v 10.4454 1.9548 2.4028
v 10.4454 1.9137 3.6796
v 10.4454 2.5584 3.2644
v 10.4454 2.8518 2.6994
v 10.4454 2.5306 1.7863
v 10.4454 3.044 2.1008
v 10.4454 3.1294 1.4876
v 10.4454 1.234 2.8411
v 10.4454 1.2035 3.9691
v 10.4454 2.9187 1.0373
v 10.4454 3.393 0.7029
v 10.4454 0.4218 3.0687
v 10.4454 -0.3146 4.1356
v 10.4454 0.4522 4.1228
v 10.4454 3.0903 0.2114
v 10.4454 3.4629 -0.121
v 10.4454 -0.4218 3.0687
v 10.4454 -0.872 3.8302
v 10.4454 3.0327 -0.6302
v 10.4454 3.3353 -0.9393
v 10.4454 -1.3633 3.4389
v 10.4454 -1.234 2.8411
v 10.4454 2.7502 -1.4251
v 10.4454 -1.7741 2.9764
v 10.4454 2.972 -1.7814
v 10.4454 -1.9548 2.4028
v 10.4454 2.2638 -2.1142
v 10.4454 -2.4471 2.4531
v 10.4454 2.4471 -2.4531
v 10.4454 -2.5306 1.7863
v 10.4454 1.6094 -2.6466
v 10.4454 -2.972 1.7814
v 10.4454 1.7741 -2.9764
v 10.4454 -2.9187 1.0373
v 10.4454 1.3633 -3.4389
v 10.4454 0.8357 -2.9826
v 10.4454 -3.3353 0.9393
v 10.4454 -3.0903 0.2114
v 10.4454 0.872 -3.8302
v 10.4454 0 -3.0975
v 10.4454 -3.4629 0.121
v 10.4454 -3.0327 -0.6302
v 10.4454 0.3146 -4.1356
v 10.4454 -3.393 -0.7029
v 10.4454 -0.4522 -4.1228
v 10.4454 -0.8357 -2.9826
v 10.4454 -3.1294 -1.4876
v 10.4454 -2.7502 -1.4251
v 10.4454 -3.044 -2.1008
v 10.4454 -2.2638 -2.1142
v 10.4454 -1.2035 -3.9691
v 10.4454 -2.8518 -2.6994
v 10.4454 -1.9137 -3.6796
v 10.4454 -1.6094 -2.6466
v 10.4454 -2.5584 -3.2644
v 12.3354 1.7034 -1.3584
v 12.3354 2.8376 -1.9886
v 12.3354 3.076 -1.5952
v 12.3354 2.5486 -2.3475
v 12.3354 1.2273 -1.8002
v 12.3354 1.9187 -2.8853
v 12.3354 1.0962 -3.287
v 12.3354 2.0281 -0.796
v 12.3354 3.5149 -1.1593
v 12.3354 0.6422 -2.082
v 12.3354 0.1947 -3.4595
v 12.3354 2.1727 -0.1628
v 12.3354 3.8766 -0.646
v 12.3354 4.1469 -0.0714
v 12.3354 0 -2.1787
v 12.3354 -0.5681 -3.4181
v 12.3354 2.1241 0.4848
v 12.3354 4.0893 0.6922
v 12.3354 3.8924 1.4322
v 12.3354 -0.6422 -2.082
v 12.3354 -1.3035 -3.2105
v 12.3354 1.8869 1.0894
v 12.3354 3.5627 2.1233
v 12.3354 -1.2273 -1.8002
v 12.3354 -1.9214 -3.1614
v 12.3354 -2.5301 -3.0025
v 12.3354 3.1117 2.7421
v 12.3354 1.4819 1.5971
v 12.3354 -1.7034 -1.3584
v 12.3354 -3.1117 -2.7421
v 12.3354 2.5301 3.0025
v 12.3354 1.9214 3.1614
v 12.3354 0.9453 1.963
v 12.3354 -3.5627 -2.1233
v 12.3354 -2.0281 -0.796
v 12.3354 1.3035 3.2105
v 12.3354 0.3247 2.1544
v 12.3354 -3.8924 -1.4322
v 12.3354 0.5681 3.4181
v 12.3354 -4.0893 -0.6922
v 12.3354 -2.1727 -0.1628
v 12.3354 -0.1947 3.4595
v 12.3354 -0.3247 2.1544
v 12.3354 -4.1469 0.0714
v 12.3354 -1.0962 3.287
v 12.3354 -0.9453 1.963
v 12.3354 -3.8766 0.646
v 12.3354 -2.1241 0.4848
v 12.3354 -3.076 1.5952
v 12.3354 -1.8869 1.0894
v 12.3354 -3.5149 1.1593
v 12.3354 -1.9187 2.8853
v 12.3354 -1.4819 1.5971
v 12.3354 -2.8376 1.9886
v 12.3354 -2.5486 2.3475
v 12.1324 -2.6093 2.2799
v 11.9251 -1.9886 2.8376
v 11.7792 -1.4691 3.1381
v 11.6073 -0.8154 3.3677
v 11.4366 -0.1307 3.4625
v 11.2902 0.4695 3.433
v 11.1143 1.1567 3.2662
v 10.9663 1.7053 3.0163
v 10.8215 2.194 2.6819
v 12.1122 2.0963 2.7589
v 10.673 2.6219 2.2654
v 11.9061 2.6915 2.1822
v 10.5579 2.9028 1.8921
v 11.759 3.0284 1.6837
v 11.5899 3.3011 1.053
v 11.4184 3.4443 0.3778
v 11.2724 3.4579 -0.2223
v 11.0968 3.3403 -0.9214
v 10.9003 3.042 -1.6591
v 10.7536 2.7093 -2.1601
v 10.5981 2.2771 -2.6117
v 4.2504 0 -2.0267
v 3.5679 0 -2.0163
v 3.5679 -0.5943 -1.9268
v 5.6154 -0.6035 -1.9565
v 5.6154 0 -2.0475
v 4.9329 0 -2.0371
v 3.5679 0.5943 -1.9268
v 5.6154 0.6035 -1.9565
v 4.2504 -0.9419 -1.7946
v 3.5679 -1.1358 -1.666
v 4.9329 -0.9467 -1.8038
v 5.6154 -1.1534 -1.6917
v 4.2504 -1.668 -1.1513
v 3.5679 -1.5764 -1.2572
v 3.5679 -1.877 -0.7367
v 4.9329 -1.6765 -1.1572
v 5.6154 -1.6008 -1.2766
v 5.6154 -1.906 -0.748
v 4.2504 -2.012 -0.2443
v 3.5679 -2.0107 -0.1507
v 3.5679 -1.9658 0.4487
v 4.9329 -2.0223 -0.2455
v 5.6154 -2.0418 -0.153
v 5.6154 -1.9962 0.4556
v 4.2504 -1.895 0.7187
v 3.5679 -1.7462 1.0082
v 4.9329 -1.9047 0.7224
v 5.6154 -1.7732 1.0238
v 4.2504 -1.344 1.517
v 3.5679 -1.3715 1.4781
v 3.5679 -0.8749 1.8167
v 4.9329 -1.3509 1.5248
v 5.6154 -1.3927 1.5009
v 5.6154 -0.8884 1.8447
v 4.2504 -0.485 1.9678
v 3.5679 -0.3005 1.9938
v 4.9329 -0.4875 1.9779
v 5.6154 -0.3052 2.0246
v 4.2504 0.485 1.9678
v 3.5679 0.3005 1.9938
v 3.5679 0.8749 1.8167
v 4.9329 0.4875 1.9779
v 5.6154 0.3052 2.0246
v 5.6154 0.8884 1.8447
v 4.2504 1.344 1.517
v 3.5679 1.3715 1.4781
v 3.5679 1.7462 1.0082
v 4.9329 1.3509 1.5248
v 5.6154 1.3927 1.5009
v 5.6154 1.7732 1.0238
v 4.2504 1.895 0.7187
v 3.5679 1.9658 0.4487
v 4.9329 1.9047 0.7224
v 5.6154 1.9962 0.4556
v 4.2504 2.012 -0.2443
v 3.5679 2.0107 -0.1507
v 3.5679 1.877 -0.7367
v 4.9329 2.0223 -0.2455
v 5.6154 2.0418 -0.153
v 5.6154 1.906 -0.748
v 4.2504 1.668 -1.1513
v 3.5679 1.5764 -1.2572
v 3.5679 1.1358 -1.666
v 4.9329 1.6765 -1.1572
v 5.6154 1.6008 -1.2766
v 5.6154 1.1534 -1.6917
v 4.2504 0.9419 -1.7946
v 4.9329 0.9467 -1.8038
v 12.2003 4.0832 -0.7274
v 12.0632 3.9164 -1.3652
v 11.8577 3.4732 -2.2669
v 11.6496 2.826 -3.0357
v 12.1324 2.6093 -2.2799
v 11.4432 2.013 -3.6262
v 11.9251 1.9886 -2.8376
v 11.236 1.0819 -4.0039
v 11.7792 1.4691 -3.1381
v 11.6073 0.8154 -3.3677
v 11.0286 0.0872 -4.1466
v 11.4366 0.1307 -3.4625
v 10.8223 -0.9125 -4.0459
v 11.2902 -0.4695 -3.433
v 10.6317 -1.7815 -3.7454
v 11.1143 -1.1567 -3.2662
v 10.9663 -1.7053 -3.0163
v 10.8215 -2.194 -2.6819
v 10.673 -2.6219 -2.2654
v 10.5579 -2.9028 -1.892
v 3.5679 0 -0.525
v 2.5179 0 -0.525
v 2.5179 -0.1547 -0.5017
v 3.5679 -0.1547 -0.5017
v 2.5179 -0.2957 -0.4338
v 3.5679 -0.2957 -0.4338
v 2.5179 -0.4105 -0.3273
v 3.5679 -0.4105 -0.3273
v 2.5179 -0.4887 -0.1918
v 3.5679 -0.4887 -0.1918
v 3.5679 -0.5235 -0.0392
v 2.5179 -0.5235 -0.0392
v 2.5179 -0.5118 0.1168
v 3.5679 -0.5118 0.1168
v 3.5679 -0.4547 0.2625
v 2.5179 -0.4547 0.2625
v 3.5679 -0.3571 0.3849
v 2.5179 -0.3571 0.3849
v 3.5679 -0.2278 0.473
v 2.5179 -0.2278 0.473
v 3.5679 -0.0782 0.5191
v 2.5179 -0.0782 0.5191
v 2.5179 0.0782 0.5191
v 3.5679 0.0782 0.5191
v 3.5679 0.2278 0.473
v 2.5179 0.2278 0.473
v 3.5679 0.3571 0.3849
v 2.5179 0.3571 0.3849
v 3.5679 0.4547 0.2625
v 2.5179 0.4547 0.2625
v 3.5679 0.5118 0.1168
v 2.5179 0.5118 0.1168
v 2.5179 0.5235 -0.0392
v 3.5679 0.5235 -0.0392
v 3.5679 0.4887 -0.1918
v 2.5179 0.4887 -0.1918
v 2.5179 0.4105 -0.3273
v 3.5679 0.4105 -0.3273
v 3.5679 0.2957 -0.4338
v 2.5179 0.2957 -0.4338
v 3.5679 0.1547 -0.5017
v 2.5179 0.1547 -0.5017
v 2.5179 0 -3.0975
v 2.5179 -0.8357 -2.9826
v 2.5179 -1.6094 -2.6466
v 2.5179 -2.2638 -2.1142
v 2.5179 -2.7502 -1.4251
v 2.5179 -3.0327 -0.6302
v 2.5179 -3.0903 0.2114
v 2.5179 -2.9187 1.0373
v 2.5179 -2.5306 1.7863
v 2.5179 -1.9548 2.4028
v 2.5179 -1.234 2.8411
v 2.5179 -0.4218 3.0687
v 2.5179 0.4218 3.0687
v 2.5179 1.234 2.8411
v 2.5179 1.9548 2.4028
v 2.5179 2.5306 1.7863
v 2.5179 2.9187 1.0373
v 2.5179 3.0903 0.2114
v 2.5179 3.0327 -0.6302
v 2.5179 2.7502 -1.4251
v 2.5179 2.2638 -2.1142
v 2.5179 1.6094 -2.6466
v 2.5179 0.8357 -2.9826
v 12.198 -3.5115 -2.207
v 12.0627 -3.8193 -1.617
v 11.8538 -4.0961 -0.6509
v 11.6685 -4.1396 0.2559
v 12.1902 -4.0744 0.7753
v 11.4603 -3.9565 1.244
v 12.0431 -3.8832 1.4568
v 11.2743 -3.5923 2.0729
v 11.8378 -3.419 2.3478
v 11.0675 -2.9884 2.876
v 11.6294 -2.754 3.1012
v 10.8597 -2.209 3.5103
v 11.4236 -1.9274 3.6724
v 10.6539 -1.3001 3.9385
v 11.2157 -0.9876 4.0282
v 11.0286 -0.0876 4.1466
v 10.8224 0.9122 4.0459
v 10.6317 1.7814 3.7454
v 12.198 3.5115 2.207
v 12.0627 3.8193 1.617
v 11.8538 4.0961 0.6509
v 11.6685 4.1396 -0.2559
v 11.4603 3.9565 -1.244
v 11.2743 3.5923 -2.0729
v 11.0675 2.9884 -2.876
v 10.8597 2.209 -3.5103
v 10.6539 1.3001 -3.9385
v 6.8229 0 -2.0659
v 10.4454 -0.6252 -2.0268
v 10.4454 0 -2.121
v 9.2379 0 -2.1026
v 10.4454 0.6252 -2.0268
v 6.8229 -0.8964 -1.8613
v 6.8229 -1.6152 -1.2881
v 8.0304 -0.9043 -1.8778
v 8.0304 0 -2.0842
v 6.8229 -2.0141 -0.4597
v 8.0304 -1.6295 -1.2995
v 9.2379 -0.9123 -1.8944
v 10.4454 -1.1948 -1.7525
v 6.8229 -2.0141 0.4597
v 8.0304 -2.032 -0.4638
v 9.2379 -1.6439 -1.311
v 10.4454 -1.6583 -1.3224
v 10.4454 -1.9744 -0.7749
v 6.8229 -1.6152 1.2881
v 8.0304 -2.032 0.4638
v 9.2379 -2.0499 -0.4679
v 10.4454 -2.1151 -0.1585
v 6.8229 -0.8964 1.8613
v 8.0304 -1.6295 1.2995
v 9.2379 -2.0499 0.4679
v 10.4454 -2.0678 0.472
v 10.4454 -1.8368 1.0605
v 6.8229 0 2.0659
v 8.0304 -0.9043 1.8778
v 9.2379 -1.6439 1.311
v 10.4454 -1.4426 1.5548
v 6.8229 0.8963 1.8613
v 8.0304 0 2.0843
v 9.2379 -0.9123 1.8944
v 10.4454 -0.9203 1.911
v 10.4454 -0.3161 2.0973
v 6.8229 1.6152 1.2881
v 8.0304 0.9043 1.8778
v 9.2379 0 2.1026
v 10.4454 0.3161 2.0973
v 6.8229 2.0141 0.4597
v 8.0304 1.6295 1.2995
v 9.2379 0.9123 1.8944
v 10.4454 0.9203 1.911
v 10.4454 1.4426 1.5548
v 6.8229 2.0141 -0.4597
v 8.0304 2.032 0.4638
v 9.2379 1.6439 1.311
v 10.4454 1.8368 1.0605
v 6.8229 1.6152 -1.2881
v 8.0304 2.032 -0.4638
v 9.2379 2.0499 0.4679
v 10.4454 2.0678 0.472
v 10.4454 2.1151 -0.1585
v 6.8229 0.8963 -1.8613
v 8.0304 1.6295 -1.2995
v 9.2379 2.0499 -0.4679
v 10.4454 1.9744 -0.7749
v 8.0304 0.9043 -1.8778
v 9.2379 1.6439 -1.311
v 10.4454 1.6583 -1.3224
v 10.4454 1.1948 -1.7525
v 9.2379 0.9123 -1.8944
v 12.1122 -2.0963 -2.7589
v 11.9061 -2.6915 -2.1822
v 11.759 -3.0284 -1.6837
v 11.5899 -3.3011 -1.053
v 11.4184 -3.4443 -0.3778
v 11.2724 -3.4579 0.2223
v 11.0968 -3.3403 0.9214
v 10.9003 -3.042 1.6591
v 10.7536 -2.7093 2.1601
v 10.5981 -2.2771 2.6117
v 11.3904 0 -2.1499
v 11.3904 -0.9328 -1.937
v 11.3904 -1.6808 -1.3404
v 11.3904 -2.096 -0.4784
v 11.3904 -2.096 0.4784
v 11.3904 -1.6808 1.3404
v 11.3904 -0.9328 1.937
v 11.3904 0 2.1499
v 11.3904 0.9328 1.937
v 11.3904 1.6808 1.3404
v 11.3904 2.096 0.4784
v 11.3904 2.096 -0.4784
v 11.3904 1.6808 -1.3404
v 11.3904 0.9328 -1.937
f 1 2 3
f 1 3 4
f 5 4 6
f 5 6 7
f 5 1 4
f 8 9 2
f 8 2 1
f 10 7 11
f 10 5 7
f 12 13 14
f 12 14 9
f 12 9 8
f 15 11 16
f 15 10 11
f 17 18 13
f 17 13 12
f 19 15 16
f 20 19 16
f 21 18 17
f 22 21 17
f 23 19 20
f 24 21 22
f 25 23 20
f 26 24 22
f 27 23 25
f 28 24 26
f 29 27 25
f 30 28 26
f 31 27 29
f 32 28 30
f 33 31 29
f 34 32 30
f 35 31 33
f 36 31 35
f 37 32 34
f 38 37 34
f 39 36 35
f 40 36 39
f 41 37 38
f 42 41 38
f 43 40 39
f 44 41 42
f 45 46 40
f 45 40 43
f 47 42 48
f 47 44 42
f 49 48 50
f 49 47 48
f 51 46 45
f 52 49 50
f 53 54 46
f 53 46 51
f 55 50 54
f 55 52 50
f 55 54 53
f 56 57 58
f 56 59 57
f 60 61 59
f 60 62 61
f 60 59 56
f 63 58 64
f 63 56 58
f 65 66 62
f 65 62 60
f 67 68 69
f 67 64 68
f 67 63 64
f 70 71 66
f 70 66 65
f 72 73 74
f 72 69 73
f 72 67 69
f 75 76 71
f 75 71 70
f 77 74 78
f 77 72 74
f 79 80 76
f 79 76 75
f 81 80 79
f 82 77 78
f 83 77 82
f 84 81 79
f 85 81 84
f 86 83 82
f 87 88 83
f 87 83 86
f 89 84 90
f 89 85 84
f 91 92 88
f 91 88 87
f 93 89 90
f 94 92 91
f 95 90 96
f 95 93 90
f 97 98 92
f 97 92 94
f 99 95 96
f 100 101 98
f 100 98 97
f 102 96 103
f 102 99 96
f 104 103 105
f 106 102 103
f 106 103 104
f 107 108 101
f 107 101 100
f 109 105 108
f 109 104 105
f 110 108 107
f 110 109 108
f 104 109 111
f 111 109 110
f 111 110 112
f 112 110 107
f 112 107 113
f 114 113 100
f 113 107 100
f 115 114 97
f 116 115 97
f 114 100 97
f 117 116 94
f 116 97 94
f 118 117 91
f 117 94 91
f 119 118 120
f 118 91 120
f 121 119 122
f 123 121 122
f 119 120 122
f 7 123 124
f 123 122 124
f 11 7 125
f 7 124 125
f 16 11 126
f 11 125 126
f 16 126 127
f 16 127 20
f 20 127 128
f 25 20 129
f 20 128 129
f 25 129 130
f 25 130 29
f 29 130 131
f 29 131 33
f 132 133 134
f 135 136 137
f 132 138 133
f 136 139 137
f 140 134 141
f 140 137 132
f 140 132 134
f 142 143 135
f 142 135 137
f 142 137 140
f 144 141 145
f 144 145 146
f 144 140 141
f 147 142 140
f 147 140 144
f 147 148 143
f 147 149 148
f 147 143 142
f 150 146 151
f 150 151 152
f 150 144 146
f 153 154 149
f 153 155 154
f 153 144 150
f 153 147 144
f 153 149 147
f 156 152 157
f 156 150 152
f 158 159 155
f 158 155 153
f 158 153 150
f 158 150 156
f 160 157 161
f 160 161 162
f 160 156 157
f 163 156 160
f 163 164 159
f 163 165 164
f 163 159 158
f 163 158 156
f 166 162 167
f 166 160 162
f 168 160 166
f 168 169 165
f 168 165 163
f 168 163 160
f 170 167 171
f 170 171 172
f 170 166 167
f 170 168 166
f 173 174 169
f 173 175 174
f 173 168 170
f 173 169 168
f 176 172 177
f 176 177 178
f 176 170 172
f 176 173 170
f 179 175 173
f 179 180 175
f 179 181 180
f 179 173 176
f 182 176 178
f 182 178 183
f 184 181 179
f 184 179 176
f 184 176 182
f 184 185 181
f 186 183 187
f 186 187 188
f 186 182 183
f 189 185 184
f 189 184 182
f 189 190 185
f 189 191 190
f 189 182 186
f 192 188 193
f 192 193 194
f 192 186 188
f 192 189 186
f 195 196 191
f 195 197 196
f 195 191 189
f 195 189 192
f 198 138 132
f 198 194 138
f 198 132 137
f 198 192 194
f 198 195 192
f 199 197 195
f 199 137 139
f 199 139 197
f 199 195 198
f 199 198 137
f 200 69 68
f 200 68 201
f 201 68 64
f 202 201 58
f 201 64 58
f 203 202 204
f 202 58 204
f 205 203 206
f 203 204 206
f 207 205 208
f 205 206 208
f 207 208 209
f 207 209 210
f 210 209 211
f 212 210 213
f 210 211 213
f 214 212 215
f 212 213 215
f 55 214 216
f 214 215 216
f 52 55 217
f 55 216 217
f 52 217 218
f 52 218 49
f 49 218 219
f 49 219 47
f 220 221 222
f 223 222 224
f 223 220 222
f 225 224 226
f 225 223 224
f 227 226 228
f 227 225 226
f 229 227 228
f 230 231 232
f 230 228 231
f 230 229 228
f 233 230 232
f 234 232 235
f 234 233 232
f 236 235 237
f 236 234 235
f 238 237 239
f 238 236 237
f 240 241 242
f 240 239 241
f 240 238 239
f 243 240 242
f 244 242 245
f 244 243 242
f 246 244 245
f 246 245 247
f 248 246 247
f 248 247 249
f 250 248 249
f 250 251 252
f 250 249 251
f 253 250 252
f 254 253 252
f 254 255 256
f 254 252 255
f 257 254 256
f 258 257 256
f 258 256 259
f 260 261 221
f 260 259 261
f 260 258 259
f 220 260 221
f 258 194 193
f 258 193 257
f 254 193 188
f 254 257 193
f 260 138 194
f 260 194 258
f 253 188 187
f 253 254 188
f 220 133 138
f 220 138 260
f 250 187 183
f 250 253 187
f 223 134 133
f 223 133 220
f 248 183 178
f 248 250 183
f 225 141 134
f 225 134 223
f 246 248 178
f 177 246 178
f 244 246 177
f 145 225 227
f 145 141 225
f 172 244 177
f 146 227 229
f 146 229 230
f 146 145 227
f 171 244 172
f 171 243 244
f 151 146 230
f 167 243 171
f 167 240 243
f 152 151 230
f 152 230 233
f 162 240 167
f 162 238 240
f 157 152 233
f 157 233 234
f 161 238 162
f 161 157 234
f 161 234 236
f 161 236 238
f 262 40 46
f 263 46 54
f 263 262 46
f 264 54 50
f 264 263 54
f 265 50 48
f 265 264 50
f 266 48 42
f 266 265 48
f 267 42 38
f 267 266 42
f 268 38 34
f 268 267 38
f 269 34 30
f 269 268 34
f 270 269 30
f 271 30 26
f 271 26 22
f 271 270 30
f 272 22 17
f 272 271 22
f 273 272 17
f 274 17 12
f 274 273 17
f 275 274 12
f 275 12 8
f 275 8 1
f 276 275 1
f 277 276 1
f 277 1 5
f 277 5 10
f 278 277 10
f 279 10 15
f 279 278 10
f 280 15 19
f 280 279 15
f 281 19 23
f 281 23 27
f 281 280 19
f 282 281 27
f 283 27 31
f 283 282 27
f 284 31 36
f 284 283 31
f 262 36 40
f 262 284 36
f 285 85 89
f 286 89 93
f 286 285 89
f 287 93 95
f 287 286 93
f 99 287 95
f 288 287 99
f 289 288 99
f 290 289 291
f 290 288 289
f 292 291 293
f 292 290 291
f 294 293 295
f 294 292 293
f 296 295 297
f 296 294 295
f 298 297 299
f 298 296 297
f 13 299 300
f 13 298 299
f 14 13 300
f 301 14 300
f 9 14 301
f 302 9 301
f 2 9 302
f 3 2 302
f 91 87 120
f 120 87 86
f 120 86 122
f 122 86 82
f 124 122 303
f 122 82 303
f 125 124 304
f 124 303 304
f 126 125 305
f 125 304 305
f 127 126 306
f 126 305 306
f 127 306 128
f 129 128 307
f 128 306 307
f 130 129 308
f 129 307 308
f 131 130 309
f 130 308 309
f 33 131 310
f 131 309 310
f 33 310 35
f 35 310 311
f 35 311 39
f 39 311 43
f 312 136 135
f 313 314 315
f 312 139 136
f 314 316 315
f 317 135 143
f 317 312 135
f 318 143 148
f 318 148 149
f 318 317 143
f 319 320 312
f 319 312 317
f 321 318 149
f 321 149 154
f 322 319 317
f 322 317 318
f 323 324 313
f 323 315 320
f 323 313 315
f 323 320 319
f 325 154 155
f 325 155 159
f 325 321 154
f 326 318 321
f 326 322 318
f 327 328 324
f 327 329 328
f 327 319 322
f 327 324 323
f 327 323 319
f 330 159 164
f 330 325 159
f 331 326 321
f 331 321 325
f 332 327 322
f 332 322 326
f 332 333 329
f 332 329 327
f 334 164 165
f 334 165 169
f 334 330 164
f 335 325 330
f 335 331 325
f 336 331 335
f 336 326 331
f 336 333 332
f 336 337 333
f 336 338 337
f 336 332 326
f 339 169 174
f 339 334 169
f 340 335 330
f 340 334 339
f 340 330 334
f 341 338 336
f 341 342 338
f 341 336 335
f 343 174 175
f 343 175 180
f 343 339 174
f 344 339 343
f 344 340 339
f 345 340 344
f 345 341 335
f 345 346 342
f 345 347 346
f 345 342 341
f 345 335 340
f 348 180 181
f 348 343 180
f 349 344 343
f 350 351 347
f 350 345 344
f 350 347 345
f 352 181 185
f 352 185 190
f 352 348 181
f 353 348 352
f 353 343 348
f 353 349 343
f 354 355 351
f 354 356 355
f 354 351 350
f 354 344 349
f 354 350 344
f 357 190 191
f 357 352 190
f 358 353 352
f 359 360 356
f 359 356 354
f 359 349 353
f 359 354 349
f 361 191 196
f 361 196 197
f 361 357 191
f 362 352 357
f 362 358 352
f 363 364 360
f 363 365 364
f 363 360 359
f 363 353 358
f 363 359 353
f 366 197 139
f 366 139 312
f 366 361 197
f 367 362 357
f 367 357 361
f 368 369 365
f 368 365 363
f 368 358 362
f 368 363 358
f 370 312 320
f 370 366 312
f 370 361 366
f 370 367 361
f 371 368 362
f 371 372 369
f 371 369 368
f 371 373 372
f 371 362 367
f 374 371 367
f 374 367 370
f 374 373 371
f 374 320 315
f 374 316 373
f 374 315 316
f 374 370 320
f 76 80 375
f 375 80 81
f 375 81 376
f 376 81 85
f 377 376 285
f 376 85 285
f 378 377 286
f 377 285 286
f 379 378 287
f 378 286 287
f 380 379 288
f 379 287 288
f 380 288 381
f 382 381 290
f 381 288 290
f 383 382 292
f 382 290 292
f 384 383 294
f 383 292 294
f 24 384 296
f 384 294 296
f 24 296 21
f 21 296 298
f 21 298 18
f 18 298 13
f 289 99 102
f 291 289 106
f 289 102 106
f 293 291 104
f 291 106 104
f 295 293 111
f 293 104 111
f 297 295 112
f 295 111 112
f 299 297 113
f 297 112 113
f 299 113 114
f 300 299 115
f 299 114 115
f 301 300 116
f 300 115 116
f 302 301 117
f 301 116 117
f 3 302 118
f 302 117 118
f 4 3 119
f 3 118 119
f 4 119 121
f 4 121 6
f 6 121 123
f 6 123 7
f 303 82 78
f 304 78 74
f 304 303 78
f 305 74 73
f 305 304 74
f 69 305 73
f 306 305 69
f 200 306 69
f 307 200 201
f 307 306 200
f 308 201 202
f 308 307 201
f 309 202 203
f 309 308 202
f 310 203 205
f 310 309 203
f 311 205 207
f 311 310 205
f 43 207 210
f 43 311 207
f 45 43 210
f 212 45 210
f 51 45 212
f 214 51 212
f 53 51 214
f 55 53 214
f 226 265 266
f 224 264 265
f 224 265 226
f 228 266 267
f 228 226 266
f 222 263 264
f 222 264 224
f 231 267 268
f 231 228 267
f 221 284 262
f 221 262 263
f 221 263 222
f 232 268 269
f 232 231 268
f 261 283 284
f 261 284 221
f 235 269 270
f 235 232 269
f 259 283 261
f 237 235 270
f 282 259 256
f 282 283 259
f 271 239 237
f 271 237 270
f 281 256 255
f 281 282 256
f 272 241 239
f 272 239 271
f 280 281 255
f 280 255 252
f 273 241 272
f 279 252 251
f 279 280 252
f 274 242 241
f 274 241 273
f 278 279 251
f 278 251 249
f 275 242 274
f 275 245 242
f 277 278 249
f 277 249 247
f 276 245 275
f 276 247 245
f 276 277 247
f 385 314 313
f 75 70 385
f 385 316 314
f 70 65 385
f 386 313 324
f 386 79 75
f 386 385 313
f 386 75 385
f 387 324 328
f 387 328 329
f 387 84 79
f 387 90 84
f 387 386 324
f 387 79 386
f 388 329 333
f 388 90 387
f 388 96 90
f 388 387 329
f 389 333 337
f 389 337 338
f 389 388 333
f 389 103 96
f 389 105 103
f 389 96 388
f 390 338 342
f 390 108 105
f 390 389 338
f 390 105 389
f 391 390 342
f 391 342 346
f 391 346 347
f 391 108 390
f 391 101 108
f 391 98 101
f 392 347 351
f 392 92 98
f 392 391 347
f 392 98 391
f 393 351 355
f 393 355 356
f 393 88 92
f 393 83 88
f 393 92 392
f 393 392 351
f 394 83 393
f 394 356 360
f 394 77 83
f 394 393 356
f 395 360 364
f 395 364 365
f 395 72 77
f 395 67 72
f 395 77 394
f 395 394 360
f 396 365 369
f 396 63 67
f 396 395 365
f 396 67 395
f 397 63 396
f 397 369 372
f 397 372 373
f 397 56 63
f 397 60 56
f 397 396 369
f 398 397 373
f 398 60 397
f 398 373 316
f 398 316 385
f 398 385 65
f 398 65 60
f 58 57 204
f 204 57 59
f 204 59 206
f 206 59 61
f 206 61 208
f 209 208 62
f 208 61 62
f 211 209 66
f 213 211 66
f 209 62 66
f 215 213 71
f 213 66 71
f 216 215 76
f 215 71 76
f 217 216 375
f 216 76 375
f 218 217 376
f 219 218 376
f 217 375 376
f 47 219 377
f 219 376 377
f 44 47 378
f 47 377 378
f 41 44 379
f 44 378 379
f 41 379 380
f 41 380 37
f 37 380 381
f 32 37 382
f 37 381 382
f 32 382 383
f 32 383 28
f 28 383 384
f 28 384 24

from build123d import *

# Parameters (mm, degrees)
ESQUISSE2_OUTSIDE_W                   = 16.214
ESQUISSE2_OUTSIDE_H                   = 16.214
ENL_V_MAT_EXTRU_1_DEPTH               = 17.967468874
ENL_VEMENT_DE_MATI_RE_BALAYAGE2_PITCH = 5.1
R_P_TITION_CIRCULAIRE1_COUNT          = 2
ENL_VEMENT_DE_MATI_RE_BALAYAGE3_PITCH = 0.85
CONG_1_R                              = 0.2
SCALE1_SCALE                          = 1.05


with BuildPart() as part:
    # Esquisse1 → Révolution1 (revolve)
    with BuildSketch(Plane.XY, mode=Mode.PRIVATE) as r_volution1_sk:
        Polygon((10.309090909, 2.95), (5.709090909, 2.95), (5.709090909, 4.55), (3.309090909, 4.55), (2.309090909, 3.175), (-3.190909091, 3.175), (-3.190909091, 1.4), (-4.490909091, 1.075), (-5.690909091, 1.075), (-5.690909091, 1.3), (-8.690909091, 0.85), (-9.990909091, 0.85), (-9.990909091, 0.5), (3.759090909, 0.5), (3.759090909, 1.920326087), (5.709090909, 1.95), (10.309090909, 2.02), (12.109090909, 2.075), (12.109090909, 3.95), (10.309090909, 3.95), align=None)
    revolve(r_volution1_sk.sketch.rotate(Axis((13.255472394, 0, 0), (-1, 0, 0)), 90), axis=Axis((13.255472394, 0, 0), (-1, 0, 0)))

    # Esquisse2 outside → Enlèv. mat.-Extru.1 (cut, through all)
    with BuildSketch(Plane(origin=(5.709090909, 0, 0), x_dir=(0, 0, -1), z_dir=(1, 0, 0))):
        Rectangle(ESQUISSE2_OUTSIDE_W, ESQUISSE2_OUTSIDE_H)
        Polygon((0, -4.618802154), (4, -2.309401077), (4, 2.309401077), (0, 4.618802154), (-4, 2.309401077), (-4, -2.309401077), align=None, mode=Mode.SUBTRACT)
    extrude(amount=-ENL_V_MAT_EXTRU_1_DEPTH, mode=Mode.SUBTRACT)

    # Enlèvement de matière-Balayage2: the profile of Esquisse5 screwed along a right-hand helix of 1.2 turns, 12 arcs to a turn; built about Z, then put on its axis
    enl_vement_de_mati_re_balayage2_z = Axis((0, 0, 0), (0, 0, 1))
    enl_vement_de_mati_re_balayage2_corners = [(4.45, 0, 0), (3.3, 0, -0.66395281), (3.3, 0, -1.86395281), (4.45, 0, -2.527905619)]
    with BuildLine(mode=Mode.PRIVATE) as enl_vement_de_mati_re_balayage2_profile:
        Line(enl_vement_de_mati_re_balayage2_corners[0], enl_vement_de_mati_re_balayage2_corners[1])
        Line(enl_vement_de_mati_re_balayage2_corners[1], enl_vement_de_mati_re_balayage2_corners[2])
        Line(enl_vement_de_mati_re_balayage2_corners[2], enl_vement_de_mati_re_balayage2_corners[3])
        Line(enl_vement_de_mati_re_balayage2_corners[3], enl_vement_de_mati_re_balayage2_corners[0])
    enl_vement_de_mati_re_balayage2_cap = Face(enl_vement_de_mati_re_balayage2_profile.wire())
    enl_vement_de_mati_re_balayage2_turn_angles = [0, 15, 30, 45, 60, 75, 90, 105, 120, 135, 150, 165, 180, 195, 210, 225, 240, 255, 270, 285, 300, 315, 330, 345, 360]
    enl_vement_de_mati_re_balayage2_turn_weights = [1, 0.9659258262890683, 1, 0.9659258262890683, 1, 0.9659258262890683, 1, 0.9659258262890683, 1, 0.9659258262890683, 1, 0.9659258262890683, 1, 0.9659258262890683, 1, 0.9659258262890683, 1, 0.9659258262890683, 1, 0.9659258262890683, 1, 0.9659258262890683, 1, 0.9659258262890683, 1]
    enl_vement_de_mati_re_balayage2_turn_rails = [Edge.make_bspline([Vector(p[0], p[1], 0).rotate(enl_vement_de_mati_re_balayage2_z, enl_vement_de_mati_re_balayage2_turn_angles[k]) / enl_vement_de_mati_re_balayage2_turn_weights[k] + Vector(0, 0, p[2] + ENL_VEMENT_DE_MATI_RE_BALAYAGE2_PITCH * enl_vement_de_mati_re_balayage2_turn_angles[k] / 360) for k in range(25)], [0, 0, 0, 1, 1, 2, 2, 3, 3, 4, 4, 5, 5, 6, 6, 7, 7, 8, 8, 9, 9, 10, 10, 11, 11, 12, 12, 12], 2, enl_vement_de_mati_re_balayage2_turn_weights) for p in enl_vement_de_mati_re_balayage2_corners]
    enl_vement_de_mati_re_balayage2_turn_sides = [Face.make_surface_from_curves(enl_vement_de_mati_re_balayage2_turn_rails[p[0]], enl_vement_de_mati_re_balayage2_turn_rails[p[1]]) for p in [(0, 1), (1, 2), (2, 3), (3, 0)]]
    enl_vement_de_mati_re_balayage2_last_angles = [360, 375, 390, 405, 420, 426, 432]
    enl_vement_de_mati_re_balayage2_last_weights = [1, 0.9659258262890683, 1, 0.9659258262890683, 1, 0.9945218953682725, 1]
    enl_vement_de_mati_re_balayage2_last_rails = [Edge.make_bspline([Vector(p[0], p[1], 0).rotate(enl_vement_de_mati_re_balayage2_z, enl_vement_de_mati_re_balayage2_last_angles[k]) / enl_vement_de_mati_re_balayage2_last_weights[k] + Vector(0, 0, p[2] + ENL_VEMENT_DE_MATI_RE_BALAYAGE2_PITCH * enl_vement_de_mati_re_balayage2_last_angles[k] / 360) for k in range(7)], [0, 0, 0, 1, 1, 2, 2, 3, 3, 3], 2, enl_vement_de_mati_re_balayage2_last_weights) for p in enl_vement_de_mati_re_balayage2_corners]
    enl_vement_de_mati_re_balayage2_last_sides = [Face.make_surface_from_curves(enl_vement_de_mati_re_balayage2_last_rails[p[0]], enl_vement_de_mati_re_balayage2_last_rails[p[1]]) for p in [(0, 1), (1, 2), (2, 3), (3, 0)]]
    enl_vement_de_mati_re_balayage2 = Plane(origin=(13.109090909, 0, 0), x_dir=(0, 0, -1), z_dir=(-1, 0, 0)) * Solid(Shell([*enl_vement_de_mati_re_balayage2_turn_sides, *enl_vement_de_mati_re_balayage2_last_sides, enl_vement_de_mati_re_balayage2_cap, enl_vement_de_mati_re_balayage2_cap.rotate(enl_vement_de_mati_re_balayage2_z, 432).moved(Location((0, 0, ENL_VEMENT_DE_MATI_RE_BALAYAGE2_PITCH * 432 / 360)))]))
    add(enl_vement_de_mati_re_balayage2, mode=Mode.SUBTRACT)

    # Répétition circulaire1: Enlèvement de matière-Balayage2 ×2 about axis
    r_p_tition_circulaire1_axis = Axis((3.759090909, 0, 0), (1, 0, 0))
    for i in range(1, R_P_TITION_CIRCULAIRE1_COUNT):
        add(enl_vement_de_mati_re_balayage2.rotate(r_p_tition_circulaire1_axis, i * 360 / R_P_TITION_CIRCULAIRE1_COUNT), mode=Mode.SUBTRACT)

    # Esquisse6 → Enlèvement de matière-Révolution2 (revolve, cut)
    with BuildSketch(Plane(origin=(0, 0, 0), x_dir=(1, 0, 0), z_dir=(0, 0, -1)), mode=Mode.PRIVATE) as enl_vement_de_mati_re_r_volution2_sk:
        with BuildLine():
            Line((5.209090909, 4.598364037), (5.709090909, 4.598364037))
            Line((5.709090909, 4.598364037), (5.709090909, 2.95))
            ThreePointArc((5.709090909, 2.95), (5.581340735, 3.811264187), (5.209090909, 4.598364037))
        make_face()
        Polygon((2.309090909, -3.175), (-3.190909091, -2.95), (-3.190909091, -3.175), align=None)
    revolve(enl_vement_de_mati_re_r_volution2_sk.sketch.rotate(Axis((-1.819283659, 0, 0), (1, 0, 0)), 270), axis=Axis((-1.819283659, 0, 0), (1, 0, 0)), mode=Mode.SUBTRACT)


with BuildPart() as body_2:
    # Fractionner1: the piece on the far side of the plane
    add(part.part)
    split(bisect_by=Plane(origin=(2.309090909, 0, 0), x_dir=(0, 0, 1), z_dir=(1, 0, 0)), keep=Keep.BOTTOM)

    # Enlèvement de matière-Balayage3: the profile of Esquisse8 screwed along a right-hand helix of 12 turns, 8 arcs to a turn; built about Z, then put on its axis
    enl_vement_de_mati_re_balayage3_z = Axis((0, 0, 0), (0, 0, 1))
    enl_vement_de_mati_re_balayage3_corners = [(2.65, 0, -0.05), (2.65, 0, 0.05), (3.3433932, 0, 0.5), (3.3433932, 0, -0.5)]
    with BuildLine(mode=Mode.PRIVATE) as enl_vement_de_mati_re_balayage3_profile:
        Line(enl_vement_de_mati_re_balayage3_corners[0], enl_vement_de_mati_re_balayage3_corners[1])
        Line(enl_vement_de_mati_re_balayage3_corners[1], enl_vement_de_mati_re_balayage3_corners[2])
        Line(enl_vement_de_mati_re_balayage3_corners[2], enl_vement_de_mati_re_balayage3_corners[3])
        Line(enl_vement_de_mati_re_balayage3_corners[3], enl_vement_de_mati_re_balayage3_corners[0])
    enl_vement_de_mati_re_balayage3_cap = Face(enl_vement_de_mati_re_balayage3_profile.wire())
    enl_vement_de_mati_re_balayage3_turn_angles = [0, 22.5, 45, 67.5, 90, 112.5, 135, 157.5, 180, 202.5, 225, 247.5, 270, 292.5, 315, 337.5, 360]
    enl_vement_de_mati_re_balayage3_turn_weights = [1, 0.9238795325112867, 1, 0.9238795325112867, 1, 0.9238795325112867, 1, 0.9238795325112867, 1, 0.9238795325112867, 1, 0.9238795325112867, 1, 0.9238795325112867, 1, 0.9238795325112867, 1]
    enl_vement_de_mati_re_balayage3_turn_rails = [Edge.make_bspline([Vector(p[0], p[1], 0).rotate(enl_vement_de_mati_re_balayage3_z, enl_vement_de_mati_re_balayage3_turn_angles[k]) / enl_vement_de_mati_re_balayage3_turn_weights[k] + Vector(0, 0, p[2] + ENL_VEMENT_DE_MATI_RE_BALAYAGE3_PITCH * enl_vement_de_mati_re_balayage3_turn_angles[k] / 360) for k in range(17)], [0, 0, 0, 1, 1, 2, 2, 3, 3, 4, 4, 5, 5, 6, 6, 7, 7, 8, 8, 8], 2, enl_vement_de_mati_re_balayage3_turn_weights) for p in enl_vement_de_mati_re_balayage3_corners]
    enl_vement_de_mati_re_balayage3_turn_sides = [Face.make_surface_from_curves(enl_vement_de_mati_re_balayage3_turn_rails[p[0]], enl_vement_de_mati_re_balayage3_turn_rails[p[1]]) for p in [(0, 1), (1, 2), (2, 3), (3, 0)]]
    enl_vement_de_mati_re_balayage3 = Plane(origin=(-4.190909091, 0, 0), x_dir=(0, 0, 1), z_dir=(1, 0, 0)) * Solid(Shell([*[p.moved(Location((0, 0, ENL_VEMENT_DE_MATI_RE_BALAYAGE3_PITCH * i))) for i in range(12) for p in enl_vement_de_mati_re_balayage3_turn_sides], enl_vement_de_mati_re_balayage3_cap, enl_vement_de_mati_re_balayage3_cap.rotate(enl_vement_de_mati_re_balayage3_z, 4320).moved(Location((0, 0, ENL_VEMENT_DE_MATI_RE_BALAYAGE3_PITCH * 4320 / 360)))]))
    add(enl_vement_de_mati_re_balayage3, mode=Mode.SUBTRACT)


with BuildPart() as part_1:
    add(part.part)

    # Fractionner1
    split(bisect_by=Plane(origin=(2.309090909, 0, 0), x_dir=(0, 0, 1), z_dir=(1, 0, 0)), keep=Keep.TOP)


with BuildPart() as body_2_1:
    add(body_2.part)

    # Combiner1: union part
    add(part_1.part)

    # Congé1
    cong_1_edges = [body_2_1.edges().sort_by_distance(p)[0] for p in [
        (5.709090909, -2.95, 0),
        (-3.190909091, 0, 1.4),
    ]]
    fillet(cong_1_edges, radius=CONG_1_R)

    # Sketch1 → Cut-Revolve1 (revolve, cut)
    with BuildSketch(Plane(origin=(0, 0, 0), x_dir=(1, 0, 0), z_dir=(0, 1, 0))):
        Polygon((2.759090909, 2.95), (10.307039448, 2.95), (10.307039448, 5.53408659), (-10.725109123, 5.53408659), (-10.725109123, 0.335117348), (2.759090909, 0.335117348), align=None)
        Polygon((10.307039448, -6.163499881), (10.307039448, -2.95), (2.759090909, -2.95), (2.759090909, 0), (-10.725109123, 0), (-10.725109123, -6.163499881), align=None)
    revolve(axis=Axis((-11.213736174, 0, 0), (1, 0, 0)), mode=Mode.SUBTRACT)


with BuildPart() as body_2_2:
    # Scale1: scaled about (7.582829496, 8.827e-06, -7.484e-06)
    add(body_2_1.part.scale(SCALE1_SCALE).moved(Location((-0.379141475, -4.41e-07, 3.74e-07))))


solid = body_2_2.part
